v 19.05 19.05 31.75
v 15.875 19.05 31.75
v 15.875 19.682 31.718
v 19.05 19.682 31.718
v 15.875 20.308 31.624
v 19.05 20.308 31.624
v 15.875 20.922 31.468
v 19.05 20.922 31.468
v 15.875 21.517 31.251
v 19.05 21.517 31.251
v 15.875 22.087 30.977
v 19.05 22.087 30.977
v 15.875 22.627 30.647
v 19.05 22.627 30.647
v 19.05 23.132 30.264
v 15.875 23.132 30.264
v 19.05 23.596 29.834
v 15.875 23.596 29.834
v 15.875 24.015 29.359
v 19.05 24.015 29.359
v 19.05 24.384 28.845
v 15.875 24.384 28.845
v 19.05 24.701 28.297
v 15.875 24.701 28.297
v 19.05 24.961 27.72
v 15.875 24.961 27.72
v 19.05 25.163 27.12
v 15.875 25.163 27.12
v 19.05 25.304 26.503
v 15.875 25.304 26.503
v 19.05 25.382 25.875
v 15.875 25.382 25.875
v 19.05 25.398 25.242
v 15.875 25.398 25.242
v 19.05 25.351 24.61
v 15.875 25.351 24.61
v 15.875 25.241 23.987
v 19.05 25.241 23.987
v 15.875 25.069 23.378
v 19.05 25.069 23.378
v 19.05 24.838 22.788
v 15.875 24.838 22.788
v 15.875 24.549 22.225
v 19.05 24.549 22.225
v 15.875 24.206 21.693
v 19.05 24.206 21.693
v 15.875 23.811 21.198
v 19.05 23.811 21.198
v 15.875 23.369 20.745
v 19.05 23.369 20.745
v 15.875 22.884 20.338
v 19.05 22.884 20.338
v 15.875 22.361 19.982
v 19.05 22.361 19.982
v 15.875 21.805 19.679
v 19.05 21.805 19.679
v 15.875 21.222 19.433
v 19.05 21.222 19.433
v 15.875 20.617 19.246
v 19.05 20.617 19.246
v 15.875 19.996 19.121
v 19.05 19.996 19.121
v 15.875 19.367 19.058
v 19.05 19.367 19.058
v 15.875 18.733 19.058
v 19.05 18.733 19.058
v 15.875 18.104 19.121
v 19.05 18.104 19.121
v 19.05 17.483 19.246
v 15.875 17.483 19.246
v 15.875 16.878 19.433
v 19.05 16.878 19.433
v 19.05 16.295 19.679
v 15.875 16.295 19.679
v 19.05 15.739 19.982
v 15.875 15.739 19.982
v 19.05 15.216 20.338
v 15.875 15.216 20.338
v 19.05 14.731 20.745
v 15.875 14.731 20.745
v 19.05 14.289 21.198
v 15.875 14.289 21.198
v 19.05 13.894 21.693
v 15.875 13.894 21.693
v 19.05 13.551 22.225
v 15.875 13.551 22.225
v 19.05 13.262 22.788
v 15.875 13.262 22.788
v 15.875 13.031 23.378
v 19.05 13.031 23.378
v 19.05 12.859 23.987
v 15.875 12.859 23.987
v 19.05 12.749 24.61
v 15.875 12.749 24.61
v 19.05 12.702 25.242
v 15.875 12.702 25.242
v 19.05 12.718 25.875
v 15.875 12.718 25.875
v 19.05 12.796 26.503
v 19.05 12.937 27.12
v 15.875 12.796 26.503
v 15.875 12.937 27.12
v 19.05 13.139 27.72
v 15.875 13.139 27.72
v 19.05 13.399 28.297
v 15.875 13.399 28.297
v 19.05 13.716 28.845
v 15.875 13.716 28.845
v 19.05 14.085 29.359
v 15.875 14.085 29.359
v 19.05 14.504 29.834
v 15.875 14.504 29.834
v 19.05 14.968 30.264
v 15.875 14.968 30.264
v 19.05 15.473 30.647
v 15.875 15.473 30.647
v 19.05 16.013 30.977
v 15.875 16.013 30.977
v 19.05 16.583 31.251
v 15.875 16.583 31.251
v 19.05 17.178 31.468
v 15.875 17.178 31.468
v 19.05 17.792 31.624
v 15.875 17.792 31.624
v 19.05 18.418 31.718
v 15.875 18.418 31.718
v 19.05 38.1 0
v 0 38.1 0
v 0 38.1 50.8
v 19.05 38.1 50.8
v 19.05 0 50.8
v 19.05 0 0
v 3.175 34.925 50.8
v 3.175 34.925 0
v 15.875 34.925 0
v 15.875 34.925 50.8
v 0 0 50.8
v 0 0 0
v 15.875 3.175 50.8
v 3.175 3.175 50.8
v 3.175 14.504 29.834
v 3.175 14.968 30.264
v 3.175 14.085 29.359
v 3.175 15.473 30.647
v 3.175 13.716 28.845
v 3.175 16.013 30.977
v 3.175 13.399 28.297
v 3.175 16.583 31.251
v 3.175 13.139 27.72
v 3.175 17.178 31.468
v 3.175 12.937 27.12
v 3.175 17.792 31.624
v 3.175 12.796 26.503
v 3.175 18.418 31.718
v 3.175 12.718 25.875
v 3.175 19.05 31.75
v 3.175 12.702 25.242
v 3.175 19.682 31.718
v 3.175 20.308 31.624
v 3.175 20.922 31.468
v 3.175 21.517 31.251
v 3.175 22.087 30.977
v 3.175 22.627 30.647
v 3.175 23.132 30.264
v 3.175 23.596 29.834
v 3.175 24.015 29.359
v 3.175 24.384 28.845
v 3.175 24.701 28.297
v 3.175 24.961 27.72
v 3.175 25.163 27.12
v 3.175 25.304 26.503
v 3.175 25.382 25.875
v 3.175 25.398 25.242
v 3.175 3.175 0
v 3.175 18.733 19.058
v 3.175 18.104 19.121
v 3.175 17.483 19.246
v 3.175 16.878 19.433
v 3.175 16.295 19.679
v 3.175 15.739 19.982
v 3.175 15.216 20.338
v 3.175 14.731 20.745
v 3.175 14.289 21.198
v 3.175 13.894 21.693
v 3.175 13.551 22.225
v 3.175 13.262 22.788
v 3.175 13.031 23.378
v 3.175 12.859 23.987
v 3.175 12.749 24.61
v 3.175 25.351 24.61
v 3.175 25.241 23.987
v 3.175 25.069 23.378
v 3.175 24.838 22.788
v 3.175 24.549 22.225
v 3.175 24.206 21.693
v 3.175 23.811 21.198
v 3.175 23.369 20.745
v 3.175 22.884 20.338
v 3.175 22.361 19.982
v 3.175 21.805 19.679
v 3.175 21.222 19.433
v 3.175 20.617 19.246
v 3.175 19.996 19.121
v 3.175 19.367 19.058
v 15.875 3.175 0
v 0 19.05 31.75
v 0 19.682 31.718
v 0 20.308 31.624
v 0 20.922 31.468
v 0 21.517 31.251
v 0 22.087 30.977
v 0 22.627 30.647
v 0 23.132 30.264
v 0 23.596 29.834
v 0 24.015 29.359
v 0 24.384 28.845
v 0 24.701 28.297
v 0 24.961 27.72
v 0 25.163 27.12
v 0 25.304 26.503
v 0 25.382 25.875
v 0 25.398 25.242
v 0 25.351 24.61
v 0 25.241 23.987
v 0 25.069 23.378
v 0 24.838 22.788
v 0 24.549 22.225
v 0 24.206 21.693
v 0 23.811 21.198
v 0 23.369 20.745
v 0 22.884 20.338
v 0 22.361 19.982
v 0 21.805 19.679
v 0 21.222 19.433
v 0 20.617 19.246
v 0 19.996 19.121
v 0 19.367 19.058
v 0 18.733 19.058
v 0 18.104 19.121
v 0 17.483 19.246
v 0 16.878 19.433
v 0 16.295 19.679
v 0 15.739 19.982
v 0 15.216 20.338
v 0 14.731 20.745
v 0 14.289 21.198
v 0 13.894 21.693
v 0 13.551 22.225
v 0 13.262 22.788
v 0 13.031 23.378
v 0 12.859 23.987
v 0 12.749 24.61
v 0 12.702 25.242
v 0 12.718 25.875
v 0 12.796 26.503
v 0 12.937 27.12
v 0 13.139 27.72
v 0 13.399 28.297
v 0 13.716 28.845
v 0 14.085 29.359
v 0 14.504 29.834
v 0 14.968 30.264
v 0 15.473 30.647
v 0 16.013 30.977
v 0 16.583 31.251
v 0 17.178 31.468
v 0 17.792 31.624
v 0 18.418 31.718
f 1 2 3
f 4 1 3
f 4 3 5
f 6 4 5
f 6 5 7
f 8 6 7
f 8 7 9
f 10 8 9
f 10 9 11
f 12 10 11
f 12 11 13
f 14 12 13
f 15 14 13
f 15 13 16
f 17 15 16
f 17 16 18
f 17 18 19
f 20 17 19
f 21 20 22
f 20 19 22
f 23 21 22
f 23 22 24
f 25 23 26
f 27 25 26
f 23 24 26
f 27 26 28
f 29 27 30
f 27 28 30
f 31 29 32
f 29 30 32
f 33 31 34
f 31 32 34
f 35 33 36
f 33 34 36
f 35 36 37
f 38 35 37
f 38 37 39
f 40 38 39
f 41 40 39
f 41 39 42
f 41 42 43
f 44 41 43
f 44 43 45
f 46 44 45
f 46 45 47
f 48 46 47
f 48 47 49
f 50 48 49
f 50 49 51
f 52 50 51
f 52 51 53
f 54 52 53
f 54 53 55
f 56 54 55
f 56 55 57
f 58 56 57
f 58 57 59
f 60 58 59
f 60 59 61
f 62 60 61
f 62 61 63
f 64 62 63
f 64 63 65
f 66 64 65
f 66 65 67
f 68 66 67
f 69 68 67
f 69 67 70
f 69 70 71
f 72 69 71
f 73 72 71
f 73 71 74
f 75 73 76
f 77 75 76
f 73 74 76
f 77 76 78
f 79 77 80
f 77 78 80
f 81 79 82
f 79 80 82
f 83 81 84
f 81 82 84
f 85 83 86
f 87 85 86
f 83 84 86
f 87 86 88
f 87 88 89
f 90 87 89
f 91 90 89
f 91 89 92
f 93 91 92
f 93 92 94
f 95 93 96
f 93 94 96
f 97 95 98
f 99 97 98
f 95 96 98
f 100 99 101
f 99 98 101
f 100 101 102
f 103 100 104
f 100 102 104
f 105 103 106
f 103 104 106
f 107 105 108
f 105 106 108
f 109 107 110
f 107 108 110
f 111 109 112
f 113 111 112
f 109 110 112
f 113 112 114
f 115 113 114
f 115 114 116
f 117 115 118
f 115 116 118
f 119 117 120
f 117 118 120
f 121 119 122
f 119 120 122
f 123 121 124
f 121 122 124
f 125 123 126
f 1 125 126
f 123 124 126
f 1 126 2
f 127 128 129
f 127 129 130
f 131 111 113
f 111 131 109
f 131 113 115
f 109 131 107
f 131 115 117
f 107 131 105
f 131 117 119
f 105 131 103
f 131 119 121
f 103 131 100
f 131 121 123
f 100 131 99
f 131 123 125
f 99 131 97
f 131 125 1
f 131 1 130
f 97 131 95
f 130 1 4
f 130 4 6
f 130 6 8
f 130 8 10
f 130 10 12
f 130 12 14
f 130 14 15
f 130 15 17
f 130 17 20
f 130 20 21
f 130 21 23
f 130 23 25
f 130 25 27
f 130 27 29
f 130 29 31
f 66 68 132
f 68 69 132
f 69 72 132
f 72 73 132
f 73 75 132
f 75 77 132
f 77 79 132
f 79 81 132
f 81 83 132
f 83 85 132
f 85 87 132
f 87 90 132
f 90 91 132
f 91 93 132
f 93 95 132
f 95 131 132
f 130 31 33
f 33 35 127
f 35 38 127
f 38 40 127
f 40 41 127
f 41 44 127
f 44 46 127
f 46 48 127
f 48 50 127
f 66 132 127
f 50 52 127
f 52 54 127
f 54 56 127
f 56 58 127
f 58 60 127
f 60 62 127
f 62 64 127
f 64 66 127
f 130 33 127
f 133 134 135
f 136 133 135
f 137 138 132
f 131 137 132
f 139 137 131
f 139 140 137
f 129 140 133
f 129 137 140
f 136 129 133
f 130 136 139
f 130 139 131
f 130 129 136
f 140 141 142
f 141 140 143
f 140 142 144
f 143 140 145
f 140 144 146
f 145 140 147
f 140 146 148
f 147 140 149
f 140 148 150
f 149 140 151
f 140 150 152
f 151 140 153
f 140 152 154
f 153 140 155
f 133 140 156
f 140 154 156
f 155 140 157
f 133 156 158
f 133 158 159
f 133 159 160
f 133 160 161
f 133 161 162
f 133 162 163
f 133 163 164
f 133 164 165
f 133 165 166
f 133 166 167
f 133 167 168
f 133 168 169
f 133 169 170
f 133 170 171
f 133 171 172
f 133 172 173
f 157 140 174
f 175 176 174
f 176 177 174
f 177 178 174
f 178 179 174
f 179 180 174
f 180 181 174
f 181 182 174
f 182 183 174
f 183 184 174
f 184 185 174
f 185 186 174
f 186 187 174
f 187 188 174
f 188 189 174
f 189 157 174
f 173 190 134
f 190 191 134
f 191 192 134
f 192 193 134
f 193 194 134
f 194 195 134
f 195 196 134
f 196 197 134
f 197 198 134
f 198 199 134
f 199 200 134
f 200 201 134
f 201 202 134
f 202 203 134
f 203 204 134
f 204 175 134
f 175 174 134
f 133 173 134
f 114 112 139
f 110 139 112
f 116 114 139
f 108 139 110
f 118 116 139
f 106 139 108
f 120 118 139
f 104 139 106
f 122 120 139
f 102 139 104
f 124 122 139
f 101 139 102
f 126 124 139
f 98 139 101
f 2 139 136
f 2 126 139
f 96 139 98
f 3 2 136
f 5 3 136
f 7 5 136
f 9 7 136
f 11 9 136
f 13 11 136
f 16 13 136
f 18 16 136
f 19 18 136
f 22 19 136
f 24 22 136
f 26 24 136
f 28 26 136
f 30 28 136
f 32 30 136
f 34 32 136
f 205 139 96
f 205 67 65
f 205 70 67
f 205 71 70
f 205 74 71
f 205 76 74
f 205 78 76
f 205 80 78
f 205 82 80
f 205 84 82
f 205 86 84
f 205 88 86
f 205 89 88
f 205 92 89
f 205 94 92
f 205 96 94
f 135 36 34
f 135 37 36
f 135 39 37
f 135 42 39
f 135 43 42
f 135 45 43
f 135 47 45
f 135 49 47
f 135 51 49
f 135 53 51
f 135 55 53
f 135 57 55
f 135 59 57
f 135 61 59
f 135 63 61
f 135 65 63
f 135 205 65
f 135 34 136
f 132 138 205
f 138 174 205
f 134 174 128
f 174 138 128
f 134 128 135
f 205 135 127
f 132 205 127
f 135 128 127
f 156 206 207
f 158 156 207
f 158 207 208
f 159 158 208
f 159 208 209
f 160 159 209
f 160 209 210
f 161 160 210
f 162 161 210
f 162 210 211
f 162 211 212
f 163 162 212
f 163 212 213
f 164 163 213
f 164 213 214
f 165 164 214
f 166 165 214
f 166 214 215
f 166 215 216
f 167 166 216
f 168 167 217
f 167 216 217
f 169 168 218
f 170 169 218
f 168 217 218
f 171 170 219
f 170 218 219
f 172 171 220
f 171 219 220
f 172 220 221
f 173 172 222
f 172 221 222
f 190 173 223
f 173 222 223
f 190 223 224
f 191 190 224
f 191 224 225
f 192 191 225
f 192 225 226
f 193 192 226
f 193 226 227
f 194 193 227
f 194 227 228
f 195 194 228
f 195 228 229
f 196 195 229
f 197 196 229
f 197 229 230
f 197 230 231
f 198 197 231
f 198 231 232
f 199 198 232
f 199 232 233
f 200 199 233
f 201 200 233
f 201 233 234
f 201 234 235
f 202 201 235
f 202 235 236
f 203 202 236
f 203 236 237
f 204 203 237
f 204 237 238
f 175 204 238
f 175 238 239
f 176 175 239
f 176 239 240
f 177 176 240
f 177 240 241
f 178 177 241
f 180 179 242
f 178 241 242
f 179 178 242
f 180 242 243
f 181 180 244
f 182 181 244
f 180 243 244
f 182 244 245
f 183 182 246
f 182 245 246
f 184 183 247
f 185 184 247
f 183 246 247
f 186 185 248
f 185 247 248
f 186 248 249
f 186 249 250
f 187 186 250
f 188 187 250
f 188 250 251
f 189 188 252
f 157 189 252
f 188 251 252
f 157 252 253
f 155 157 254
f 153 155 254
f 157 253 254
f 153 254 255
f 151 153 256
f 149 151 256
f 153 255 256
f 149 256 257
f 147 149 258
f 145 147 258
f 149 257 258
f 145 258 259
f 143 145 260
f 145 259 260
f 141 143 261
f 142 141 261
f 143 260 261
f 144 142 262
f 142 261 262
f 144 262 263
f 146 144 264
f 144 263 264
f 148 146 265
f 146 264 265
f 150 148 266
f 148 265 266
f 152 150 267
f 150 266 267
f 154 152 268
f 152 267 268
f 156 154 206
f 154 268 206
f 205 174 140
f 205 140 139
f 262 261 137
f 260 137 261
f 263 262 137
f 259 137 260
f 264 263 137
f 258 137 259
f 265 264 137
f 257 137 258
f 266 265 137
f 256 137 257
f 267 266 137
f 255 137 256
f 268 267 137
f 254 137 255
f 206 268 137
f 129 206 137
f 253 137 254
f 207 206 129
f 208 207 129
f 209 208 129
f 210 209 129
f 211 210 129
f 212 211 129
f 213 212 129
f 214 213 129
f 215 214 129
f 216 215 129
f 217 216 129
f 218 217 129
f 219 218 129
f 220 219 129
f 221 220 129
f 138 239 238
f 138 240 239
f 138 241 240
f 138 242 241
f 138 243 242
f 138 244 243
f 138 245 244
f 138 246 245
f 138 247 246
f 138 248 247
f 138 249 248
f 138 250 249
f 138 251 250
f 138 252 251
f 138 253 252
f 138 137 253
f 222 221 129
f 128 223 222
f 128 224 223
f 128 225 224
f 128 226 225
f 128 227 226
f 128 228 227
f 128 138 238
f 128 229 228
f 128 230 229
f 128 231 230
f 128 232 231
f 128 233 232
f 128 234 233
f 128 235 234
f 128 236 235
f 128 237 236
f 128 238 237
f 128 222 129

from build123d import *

# Parameters (mm, degrees)
SKETCH1_W           = 19.05
SKETCH1_H           = 38.1
SKETCH1_W_2         = 12.7
SKETCH1_H_2         = 31.75
EXTRUDE_THIN1_DEPTH = 50.8
SKETCH3_R           = 6.35
CUT_EXTRUDE2_DEPTH  = 67.295946332


with BuildPart() as part:
    # Sketch1 → Extrude-Thin1 (new body)
    with BuildSketch(Plane.XY):
        with Locations((9.525, 19.05)):
            Rectangle(SKETCH1_W, SKETCH1_H)
        with Locations((9.525, 19.05)):
            Rectangle(SKETCH1_W_2, SKETCH1_H_2, mode=Mode.SUBTRACT)
    extrude(amount=EXTRUDE_THIN1_DEPTH)

    # Sketch3 → Cut-Extrude2 (cut, through all)
    with BuildSketch(Plane.ZY):
        with Locations((25.4, 19.05)):
            Circle(SKETCH3_R)
    extrude(amount=-CUT_EXTRUDE2_DEPTH, mode=Mode.SUBTRACT)


solid = part.part
